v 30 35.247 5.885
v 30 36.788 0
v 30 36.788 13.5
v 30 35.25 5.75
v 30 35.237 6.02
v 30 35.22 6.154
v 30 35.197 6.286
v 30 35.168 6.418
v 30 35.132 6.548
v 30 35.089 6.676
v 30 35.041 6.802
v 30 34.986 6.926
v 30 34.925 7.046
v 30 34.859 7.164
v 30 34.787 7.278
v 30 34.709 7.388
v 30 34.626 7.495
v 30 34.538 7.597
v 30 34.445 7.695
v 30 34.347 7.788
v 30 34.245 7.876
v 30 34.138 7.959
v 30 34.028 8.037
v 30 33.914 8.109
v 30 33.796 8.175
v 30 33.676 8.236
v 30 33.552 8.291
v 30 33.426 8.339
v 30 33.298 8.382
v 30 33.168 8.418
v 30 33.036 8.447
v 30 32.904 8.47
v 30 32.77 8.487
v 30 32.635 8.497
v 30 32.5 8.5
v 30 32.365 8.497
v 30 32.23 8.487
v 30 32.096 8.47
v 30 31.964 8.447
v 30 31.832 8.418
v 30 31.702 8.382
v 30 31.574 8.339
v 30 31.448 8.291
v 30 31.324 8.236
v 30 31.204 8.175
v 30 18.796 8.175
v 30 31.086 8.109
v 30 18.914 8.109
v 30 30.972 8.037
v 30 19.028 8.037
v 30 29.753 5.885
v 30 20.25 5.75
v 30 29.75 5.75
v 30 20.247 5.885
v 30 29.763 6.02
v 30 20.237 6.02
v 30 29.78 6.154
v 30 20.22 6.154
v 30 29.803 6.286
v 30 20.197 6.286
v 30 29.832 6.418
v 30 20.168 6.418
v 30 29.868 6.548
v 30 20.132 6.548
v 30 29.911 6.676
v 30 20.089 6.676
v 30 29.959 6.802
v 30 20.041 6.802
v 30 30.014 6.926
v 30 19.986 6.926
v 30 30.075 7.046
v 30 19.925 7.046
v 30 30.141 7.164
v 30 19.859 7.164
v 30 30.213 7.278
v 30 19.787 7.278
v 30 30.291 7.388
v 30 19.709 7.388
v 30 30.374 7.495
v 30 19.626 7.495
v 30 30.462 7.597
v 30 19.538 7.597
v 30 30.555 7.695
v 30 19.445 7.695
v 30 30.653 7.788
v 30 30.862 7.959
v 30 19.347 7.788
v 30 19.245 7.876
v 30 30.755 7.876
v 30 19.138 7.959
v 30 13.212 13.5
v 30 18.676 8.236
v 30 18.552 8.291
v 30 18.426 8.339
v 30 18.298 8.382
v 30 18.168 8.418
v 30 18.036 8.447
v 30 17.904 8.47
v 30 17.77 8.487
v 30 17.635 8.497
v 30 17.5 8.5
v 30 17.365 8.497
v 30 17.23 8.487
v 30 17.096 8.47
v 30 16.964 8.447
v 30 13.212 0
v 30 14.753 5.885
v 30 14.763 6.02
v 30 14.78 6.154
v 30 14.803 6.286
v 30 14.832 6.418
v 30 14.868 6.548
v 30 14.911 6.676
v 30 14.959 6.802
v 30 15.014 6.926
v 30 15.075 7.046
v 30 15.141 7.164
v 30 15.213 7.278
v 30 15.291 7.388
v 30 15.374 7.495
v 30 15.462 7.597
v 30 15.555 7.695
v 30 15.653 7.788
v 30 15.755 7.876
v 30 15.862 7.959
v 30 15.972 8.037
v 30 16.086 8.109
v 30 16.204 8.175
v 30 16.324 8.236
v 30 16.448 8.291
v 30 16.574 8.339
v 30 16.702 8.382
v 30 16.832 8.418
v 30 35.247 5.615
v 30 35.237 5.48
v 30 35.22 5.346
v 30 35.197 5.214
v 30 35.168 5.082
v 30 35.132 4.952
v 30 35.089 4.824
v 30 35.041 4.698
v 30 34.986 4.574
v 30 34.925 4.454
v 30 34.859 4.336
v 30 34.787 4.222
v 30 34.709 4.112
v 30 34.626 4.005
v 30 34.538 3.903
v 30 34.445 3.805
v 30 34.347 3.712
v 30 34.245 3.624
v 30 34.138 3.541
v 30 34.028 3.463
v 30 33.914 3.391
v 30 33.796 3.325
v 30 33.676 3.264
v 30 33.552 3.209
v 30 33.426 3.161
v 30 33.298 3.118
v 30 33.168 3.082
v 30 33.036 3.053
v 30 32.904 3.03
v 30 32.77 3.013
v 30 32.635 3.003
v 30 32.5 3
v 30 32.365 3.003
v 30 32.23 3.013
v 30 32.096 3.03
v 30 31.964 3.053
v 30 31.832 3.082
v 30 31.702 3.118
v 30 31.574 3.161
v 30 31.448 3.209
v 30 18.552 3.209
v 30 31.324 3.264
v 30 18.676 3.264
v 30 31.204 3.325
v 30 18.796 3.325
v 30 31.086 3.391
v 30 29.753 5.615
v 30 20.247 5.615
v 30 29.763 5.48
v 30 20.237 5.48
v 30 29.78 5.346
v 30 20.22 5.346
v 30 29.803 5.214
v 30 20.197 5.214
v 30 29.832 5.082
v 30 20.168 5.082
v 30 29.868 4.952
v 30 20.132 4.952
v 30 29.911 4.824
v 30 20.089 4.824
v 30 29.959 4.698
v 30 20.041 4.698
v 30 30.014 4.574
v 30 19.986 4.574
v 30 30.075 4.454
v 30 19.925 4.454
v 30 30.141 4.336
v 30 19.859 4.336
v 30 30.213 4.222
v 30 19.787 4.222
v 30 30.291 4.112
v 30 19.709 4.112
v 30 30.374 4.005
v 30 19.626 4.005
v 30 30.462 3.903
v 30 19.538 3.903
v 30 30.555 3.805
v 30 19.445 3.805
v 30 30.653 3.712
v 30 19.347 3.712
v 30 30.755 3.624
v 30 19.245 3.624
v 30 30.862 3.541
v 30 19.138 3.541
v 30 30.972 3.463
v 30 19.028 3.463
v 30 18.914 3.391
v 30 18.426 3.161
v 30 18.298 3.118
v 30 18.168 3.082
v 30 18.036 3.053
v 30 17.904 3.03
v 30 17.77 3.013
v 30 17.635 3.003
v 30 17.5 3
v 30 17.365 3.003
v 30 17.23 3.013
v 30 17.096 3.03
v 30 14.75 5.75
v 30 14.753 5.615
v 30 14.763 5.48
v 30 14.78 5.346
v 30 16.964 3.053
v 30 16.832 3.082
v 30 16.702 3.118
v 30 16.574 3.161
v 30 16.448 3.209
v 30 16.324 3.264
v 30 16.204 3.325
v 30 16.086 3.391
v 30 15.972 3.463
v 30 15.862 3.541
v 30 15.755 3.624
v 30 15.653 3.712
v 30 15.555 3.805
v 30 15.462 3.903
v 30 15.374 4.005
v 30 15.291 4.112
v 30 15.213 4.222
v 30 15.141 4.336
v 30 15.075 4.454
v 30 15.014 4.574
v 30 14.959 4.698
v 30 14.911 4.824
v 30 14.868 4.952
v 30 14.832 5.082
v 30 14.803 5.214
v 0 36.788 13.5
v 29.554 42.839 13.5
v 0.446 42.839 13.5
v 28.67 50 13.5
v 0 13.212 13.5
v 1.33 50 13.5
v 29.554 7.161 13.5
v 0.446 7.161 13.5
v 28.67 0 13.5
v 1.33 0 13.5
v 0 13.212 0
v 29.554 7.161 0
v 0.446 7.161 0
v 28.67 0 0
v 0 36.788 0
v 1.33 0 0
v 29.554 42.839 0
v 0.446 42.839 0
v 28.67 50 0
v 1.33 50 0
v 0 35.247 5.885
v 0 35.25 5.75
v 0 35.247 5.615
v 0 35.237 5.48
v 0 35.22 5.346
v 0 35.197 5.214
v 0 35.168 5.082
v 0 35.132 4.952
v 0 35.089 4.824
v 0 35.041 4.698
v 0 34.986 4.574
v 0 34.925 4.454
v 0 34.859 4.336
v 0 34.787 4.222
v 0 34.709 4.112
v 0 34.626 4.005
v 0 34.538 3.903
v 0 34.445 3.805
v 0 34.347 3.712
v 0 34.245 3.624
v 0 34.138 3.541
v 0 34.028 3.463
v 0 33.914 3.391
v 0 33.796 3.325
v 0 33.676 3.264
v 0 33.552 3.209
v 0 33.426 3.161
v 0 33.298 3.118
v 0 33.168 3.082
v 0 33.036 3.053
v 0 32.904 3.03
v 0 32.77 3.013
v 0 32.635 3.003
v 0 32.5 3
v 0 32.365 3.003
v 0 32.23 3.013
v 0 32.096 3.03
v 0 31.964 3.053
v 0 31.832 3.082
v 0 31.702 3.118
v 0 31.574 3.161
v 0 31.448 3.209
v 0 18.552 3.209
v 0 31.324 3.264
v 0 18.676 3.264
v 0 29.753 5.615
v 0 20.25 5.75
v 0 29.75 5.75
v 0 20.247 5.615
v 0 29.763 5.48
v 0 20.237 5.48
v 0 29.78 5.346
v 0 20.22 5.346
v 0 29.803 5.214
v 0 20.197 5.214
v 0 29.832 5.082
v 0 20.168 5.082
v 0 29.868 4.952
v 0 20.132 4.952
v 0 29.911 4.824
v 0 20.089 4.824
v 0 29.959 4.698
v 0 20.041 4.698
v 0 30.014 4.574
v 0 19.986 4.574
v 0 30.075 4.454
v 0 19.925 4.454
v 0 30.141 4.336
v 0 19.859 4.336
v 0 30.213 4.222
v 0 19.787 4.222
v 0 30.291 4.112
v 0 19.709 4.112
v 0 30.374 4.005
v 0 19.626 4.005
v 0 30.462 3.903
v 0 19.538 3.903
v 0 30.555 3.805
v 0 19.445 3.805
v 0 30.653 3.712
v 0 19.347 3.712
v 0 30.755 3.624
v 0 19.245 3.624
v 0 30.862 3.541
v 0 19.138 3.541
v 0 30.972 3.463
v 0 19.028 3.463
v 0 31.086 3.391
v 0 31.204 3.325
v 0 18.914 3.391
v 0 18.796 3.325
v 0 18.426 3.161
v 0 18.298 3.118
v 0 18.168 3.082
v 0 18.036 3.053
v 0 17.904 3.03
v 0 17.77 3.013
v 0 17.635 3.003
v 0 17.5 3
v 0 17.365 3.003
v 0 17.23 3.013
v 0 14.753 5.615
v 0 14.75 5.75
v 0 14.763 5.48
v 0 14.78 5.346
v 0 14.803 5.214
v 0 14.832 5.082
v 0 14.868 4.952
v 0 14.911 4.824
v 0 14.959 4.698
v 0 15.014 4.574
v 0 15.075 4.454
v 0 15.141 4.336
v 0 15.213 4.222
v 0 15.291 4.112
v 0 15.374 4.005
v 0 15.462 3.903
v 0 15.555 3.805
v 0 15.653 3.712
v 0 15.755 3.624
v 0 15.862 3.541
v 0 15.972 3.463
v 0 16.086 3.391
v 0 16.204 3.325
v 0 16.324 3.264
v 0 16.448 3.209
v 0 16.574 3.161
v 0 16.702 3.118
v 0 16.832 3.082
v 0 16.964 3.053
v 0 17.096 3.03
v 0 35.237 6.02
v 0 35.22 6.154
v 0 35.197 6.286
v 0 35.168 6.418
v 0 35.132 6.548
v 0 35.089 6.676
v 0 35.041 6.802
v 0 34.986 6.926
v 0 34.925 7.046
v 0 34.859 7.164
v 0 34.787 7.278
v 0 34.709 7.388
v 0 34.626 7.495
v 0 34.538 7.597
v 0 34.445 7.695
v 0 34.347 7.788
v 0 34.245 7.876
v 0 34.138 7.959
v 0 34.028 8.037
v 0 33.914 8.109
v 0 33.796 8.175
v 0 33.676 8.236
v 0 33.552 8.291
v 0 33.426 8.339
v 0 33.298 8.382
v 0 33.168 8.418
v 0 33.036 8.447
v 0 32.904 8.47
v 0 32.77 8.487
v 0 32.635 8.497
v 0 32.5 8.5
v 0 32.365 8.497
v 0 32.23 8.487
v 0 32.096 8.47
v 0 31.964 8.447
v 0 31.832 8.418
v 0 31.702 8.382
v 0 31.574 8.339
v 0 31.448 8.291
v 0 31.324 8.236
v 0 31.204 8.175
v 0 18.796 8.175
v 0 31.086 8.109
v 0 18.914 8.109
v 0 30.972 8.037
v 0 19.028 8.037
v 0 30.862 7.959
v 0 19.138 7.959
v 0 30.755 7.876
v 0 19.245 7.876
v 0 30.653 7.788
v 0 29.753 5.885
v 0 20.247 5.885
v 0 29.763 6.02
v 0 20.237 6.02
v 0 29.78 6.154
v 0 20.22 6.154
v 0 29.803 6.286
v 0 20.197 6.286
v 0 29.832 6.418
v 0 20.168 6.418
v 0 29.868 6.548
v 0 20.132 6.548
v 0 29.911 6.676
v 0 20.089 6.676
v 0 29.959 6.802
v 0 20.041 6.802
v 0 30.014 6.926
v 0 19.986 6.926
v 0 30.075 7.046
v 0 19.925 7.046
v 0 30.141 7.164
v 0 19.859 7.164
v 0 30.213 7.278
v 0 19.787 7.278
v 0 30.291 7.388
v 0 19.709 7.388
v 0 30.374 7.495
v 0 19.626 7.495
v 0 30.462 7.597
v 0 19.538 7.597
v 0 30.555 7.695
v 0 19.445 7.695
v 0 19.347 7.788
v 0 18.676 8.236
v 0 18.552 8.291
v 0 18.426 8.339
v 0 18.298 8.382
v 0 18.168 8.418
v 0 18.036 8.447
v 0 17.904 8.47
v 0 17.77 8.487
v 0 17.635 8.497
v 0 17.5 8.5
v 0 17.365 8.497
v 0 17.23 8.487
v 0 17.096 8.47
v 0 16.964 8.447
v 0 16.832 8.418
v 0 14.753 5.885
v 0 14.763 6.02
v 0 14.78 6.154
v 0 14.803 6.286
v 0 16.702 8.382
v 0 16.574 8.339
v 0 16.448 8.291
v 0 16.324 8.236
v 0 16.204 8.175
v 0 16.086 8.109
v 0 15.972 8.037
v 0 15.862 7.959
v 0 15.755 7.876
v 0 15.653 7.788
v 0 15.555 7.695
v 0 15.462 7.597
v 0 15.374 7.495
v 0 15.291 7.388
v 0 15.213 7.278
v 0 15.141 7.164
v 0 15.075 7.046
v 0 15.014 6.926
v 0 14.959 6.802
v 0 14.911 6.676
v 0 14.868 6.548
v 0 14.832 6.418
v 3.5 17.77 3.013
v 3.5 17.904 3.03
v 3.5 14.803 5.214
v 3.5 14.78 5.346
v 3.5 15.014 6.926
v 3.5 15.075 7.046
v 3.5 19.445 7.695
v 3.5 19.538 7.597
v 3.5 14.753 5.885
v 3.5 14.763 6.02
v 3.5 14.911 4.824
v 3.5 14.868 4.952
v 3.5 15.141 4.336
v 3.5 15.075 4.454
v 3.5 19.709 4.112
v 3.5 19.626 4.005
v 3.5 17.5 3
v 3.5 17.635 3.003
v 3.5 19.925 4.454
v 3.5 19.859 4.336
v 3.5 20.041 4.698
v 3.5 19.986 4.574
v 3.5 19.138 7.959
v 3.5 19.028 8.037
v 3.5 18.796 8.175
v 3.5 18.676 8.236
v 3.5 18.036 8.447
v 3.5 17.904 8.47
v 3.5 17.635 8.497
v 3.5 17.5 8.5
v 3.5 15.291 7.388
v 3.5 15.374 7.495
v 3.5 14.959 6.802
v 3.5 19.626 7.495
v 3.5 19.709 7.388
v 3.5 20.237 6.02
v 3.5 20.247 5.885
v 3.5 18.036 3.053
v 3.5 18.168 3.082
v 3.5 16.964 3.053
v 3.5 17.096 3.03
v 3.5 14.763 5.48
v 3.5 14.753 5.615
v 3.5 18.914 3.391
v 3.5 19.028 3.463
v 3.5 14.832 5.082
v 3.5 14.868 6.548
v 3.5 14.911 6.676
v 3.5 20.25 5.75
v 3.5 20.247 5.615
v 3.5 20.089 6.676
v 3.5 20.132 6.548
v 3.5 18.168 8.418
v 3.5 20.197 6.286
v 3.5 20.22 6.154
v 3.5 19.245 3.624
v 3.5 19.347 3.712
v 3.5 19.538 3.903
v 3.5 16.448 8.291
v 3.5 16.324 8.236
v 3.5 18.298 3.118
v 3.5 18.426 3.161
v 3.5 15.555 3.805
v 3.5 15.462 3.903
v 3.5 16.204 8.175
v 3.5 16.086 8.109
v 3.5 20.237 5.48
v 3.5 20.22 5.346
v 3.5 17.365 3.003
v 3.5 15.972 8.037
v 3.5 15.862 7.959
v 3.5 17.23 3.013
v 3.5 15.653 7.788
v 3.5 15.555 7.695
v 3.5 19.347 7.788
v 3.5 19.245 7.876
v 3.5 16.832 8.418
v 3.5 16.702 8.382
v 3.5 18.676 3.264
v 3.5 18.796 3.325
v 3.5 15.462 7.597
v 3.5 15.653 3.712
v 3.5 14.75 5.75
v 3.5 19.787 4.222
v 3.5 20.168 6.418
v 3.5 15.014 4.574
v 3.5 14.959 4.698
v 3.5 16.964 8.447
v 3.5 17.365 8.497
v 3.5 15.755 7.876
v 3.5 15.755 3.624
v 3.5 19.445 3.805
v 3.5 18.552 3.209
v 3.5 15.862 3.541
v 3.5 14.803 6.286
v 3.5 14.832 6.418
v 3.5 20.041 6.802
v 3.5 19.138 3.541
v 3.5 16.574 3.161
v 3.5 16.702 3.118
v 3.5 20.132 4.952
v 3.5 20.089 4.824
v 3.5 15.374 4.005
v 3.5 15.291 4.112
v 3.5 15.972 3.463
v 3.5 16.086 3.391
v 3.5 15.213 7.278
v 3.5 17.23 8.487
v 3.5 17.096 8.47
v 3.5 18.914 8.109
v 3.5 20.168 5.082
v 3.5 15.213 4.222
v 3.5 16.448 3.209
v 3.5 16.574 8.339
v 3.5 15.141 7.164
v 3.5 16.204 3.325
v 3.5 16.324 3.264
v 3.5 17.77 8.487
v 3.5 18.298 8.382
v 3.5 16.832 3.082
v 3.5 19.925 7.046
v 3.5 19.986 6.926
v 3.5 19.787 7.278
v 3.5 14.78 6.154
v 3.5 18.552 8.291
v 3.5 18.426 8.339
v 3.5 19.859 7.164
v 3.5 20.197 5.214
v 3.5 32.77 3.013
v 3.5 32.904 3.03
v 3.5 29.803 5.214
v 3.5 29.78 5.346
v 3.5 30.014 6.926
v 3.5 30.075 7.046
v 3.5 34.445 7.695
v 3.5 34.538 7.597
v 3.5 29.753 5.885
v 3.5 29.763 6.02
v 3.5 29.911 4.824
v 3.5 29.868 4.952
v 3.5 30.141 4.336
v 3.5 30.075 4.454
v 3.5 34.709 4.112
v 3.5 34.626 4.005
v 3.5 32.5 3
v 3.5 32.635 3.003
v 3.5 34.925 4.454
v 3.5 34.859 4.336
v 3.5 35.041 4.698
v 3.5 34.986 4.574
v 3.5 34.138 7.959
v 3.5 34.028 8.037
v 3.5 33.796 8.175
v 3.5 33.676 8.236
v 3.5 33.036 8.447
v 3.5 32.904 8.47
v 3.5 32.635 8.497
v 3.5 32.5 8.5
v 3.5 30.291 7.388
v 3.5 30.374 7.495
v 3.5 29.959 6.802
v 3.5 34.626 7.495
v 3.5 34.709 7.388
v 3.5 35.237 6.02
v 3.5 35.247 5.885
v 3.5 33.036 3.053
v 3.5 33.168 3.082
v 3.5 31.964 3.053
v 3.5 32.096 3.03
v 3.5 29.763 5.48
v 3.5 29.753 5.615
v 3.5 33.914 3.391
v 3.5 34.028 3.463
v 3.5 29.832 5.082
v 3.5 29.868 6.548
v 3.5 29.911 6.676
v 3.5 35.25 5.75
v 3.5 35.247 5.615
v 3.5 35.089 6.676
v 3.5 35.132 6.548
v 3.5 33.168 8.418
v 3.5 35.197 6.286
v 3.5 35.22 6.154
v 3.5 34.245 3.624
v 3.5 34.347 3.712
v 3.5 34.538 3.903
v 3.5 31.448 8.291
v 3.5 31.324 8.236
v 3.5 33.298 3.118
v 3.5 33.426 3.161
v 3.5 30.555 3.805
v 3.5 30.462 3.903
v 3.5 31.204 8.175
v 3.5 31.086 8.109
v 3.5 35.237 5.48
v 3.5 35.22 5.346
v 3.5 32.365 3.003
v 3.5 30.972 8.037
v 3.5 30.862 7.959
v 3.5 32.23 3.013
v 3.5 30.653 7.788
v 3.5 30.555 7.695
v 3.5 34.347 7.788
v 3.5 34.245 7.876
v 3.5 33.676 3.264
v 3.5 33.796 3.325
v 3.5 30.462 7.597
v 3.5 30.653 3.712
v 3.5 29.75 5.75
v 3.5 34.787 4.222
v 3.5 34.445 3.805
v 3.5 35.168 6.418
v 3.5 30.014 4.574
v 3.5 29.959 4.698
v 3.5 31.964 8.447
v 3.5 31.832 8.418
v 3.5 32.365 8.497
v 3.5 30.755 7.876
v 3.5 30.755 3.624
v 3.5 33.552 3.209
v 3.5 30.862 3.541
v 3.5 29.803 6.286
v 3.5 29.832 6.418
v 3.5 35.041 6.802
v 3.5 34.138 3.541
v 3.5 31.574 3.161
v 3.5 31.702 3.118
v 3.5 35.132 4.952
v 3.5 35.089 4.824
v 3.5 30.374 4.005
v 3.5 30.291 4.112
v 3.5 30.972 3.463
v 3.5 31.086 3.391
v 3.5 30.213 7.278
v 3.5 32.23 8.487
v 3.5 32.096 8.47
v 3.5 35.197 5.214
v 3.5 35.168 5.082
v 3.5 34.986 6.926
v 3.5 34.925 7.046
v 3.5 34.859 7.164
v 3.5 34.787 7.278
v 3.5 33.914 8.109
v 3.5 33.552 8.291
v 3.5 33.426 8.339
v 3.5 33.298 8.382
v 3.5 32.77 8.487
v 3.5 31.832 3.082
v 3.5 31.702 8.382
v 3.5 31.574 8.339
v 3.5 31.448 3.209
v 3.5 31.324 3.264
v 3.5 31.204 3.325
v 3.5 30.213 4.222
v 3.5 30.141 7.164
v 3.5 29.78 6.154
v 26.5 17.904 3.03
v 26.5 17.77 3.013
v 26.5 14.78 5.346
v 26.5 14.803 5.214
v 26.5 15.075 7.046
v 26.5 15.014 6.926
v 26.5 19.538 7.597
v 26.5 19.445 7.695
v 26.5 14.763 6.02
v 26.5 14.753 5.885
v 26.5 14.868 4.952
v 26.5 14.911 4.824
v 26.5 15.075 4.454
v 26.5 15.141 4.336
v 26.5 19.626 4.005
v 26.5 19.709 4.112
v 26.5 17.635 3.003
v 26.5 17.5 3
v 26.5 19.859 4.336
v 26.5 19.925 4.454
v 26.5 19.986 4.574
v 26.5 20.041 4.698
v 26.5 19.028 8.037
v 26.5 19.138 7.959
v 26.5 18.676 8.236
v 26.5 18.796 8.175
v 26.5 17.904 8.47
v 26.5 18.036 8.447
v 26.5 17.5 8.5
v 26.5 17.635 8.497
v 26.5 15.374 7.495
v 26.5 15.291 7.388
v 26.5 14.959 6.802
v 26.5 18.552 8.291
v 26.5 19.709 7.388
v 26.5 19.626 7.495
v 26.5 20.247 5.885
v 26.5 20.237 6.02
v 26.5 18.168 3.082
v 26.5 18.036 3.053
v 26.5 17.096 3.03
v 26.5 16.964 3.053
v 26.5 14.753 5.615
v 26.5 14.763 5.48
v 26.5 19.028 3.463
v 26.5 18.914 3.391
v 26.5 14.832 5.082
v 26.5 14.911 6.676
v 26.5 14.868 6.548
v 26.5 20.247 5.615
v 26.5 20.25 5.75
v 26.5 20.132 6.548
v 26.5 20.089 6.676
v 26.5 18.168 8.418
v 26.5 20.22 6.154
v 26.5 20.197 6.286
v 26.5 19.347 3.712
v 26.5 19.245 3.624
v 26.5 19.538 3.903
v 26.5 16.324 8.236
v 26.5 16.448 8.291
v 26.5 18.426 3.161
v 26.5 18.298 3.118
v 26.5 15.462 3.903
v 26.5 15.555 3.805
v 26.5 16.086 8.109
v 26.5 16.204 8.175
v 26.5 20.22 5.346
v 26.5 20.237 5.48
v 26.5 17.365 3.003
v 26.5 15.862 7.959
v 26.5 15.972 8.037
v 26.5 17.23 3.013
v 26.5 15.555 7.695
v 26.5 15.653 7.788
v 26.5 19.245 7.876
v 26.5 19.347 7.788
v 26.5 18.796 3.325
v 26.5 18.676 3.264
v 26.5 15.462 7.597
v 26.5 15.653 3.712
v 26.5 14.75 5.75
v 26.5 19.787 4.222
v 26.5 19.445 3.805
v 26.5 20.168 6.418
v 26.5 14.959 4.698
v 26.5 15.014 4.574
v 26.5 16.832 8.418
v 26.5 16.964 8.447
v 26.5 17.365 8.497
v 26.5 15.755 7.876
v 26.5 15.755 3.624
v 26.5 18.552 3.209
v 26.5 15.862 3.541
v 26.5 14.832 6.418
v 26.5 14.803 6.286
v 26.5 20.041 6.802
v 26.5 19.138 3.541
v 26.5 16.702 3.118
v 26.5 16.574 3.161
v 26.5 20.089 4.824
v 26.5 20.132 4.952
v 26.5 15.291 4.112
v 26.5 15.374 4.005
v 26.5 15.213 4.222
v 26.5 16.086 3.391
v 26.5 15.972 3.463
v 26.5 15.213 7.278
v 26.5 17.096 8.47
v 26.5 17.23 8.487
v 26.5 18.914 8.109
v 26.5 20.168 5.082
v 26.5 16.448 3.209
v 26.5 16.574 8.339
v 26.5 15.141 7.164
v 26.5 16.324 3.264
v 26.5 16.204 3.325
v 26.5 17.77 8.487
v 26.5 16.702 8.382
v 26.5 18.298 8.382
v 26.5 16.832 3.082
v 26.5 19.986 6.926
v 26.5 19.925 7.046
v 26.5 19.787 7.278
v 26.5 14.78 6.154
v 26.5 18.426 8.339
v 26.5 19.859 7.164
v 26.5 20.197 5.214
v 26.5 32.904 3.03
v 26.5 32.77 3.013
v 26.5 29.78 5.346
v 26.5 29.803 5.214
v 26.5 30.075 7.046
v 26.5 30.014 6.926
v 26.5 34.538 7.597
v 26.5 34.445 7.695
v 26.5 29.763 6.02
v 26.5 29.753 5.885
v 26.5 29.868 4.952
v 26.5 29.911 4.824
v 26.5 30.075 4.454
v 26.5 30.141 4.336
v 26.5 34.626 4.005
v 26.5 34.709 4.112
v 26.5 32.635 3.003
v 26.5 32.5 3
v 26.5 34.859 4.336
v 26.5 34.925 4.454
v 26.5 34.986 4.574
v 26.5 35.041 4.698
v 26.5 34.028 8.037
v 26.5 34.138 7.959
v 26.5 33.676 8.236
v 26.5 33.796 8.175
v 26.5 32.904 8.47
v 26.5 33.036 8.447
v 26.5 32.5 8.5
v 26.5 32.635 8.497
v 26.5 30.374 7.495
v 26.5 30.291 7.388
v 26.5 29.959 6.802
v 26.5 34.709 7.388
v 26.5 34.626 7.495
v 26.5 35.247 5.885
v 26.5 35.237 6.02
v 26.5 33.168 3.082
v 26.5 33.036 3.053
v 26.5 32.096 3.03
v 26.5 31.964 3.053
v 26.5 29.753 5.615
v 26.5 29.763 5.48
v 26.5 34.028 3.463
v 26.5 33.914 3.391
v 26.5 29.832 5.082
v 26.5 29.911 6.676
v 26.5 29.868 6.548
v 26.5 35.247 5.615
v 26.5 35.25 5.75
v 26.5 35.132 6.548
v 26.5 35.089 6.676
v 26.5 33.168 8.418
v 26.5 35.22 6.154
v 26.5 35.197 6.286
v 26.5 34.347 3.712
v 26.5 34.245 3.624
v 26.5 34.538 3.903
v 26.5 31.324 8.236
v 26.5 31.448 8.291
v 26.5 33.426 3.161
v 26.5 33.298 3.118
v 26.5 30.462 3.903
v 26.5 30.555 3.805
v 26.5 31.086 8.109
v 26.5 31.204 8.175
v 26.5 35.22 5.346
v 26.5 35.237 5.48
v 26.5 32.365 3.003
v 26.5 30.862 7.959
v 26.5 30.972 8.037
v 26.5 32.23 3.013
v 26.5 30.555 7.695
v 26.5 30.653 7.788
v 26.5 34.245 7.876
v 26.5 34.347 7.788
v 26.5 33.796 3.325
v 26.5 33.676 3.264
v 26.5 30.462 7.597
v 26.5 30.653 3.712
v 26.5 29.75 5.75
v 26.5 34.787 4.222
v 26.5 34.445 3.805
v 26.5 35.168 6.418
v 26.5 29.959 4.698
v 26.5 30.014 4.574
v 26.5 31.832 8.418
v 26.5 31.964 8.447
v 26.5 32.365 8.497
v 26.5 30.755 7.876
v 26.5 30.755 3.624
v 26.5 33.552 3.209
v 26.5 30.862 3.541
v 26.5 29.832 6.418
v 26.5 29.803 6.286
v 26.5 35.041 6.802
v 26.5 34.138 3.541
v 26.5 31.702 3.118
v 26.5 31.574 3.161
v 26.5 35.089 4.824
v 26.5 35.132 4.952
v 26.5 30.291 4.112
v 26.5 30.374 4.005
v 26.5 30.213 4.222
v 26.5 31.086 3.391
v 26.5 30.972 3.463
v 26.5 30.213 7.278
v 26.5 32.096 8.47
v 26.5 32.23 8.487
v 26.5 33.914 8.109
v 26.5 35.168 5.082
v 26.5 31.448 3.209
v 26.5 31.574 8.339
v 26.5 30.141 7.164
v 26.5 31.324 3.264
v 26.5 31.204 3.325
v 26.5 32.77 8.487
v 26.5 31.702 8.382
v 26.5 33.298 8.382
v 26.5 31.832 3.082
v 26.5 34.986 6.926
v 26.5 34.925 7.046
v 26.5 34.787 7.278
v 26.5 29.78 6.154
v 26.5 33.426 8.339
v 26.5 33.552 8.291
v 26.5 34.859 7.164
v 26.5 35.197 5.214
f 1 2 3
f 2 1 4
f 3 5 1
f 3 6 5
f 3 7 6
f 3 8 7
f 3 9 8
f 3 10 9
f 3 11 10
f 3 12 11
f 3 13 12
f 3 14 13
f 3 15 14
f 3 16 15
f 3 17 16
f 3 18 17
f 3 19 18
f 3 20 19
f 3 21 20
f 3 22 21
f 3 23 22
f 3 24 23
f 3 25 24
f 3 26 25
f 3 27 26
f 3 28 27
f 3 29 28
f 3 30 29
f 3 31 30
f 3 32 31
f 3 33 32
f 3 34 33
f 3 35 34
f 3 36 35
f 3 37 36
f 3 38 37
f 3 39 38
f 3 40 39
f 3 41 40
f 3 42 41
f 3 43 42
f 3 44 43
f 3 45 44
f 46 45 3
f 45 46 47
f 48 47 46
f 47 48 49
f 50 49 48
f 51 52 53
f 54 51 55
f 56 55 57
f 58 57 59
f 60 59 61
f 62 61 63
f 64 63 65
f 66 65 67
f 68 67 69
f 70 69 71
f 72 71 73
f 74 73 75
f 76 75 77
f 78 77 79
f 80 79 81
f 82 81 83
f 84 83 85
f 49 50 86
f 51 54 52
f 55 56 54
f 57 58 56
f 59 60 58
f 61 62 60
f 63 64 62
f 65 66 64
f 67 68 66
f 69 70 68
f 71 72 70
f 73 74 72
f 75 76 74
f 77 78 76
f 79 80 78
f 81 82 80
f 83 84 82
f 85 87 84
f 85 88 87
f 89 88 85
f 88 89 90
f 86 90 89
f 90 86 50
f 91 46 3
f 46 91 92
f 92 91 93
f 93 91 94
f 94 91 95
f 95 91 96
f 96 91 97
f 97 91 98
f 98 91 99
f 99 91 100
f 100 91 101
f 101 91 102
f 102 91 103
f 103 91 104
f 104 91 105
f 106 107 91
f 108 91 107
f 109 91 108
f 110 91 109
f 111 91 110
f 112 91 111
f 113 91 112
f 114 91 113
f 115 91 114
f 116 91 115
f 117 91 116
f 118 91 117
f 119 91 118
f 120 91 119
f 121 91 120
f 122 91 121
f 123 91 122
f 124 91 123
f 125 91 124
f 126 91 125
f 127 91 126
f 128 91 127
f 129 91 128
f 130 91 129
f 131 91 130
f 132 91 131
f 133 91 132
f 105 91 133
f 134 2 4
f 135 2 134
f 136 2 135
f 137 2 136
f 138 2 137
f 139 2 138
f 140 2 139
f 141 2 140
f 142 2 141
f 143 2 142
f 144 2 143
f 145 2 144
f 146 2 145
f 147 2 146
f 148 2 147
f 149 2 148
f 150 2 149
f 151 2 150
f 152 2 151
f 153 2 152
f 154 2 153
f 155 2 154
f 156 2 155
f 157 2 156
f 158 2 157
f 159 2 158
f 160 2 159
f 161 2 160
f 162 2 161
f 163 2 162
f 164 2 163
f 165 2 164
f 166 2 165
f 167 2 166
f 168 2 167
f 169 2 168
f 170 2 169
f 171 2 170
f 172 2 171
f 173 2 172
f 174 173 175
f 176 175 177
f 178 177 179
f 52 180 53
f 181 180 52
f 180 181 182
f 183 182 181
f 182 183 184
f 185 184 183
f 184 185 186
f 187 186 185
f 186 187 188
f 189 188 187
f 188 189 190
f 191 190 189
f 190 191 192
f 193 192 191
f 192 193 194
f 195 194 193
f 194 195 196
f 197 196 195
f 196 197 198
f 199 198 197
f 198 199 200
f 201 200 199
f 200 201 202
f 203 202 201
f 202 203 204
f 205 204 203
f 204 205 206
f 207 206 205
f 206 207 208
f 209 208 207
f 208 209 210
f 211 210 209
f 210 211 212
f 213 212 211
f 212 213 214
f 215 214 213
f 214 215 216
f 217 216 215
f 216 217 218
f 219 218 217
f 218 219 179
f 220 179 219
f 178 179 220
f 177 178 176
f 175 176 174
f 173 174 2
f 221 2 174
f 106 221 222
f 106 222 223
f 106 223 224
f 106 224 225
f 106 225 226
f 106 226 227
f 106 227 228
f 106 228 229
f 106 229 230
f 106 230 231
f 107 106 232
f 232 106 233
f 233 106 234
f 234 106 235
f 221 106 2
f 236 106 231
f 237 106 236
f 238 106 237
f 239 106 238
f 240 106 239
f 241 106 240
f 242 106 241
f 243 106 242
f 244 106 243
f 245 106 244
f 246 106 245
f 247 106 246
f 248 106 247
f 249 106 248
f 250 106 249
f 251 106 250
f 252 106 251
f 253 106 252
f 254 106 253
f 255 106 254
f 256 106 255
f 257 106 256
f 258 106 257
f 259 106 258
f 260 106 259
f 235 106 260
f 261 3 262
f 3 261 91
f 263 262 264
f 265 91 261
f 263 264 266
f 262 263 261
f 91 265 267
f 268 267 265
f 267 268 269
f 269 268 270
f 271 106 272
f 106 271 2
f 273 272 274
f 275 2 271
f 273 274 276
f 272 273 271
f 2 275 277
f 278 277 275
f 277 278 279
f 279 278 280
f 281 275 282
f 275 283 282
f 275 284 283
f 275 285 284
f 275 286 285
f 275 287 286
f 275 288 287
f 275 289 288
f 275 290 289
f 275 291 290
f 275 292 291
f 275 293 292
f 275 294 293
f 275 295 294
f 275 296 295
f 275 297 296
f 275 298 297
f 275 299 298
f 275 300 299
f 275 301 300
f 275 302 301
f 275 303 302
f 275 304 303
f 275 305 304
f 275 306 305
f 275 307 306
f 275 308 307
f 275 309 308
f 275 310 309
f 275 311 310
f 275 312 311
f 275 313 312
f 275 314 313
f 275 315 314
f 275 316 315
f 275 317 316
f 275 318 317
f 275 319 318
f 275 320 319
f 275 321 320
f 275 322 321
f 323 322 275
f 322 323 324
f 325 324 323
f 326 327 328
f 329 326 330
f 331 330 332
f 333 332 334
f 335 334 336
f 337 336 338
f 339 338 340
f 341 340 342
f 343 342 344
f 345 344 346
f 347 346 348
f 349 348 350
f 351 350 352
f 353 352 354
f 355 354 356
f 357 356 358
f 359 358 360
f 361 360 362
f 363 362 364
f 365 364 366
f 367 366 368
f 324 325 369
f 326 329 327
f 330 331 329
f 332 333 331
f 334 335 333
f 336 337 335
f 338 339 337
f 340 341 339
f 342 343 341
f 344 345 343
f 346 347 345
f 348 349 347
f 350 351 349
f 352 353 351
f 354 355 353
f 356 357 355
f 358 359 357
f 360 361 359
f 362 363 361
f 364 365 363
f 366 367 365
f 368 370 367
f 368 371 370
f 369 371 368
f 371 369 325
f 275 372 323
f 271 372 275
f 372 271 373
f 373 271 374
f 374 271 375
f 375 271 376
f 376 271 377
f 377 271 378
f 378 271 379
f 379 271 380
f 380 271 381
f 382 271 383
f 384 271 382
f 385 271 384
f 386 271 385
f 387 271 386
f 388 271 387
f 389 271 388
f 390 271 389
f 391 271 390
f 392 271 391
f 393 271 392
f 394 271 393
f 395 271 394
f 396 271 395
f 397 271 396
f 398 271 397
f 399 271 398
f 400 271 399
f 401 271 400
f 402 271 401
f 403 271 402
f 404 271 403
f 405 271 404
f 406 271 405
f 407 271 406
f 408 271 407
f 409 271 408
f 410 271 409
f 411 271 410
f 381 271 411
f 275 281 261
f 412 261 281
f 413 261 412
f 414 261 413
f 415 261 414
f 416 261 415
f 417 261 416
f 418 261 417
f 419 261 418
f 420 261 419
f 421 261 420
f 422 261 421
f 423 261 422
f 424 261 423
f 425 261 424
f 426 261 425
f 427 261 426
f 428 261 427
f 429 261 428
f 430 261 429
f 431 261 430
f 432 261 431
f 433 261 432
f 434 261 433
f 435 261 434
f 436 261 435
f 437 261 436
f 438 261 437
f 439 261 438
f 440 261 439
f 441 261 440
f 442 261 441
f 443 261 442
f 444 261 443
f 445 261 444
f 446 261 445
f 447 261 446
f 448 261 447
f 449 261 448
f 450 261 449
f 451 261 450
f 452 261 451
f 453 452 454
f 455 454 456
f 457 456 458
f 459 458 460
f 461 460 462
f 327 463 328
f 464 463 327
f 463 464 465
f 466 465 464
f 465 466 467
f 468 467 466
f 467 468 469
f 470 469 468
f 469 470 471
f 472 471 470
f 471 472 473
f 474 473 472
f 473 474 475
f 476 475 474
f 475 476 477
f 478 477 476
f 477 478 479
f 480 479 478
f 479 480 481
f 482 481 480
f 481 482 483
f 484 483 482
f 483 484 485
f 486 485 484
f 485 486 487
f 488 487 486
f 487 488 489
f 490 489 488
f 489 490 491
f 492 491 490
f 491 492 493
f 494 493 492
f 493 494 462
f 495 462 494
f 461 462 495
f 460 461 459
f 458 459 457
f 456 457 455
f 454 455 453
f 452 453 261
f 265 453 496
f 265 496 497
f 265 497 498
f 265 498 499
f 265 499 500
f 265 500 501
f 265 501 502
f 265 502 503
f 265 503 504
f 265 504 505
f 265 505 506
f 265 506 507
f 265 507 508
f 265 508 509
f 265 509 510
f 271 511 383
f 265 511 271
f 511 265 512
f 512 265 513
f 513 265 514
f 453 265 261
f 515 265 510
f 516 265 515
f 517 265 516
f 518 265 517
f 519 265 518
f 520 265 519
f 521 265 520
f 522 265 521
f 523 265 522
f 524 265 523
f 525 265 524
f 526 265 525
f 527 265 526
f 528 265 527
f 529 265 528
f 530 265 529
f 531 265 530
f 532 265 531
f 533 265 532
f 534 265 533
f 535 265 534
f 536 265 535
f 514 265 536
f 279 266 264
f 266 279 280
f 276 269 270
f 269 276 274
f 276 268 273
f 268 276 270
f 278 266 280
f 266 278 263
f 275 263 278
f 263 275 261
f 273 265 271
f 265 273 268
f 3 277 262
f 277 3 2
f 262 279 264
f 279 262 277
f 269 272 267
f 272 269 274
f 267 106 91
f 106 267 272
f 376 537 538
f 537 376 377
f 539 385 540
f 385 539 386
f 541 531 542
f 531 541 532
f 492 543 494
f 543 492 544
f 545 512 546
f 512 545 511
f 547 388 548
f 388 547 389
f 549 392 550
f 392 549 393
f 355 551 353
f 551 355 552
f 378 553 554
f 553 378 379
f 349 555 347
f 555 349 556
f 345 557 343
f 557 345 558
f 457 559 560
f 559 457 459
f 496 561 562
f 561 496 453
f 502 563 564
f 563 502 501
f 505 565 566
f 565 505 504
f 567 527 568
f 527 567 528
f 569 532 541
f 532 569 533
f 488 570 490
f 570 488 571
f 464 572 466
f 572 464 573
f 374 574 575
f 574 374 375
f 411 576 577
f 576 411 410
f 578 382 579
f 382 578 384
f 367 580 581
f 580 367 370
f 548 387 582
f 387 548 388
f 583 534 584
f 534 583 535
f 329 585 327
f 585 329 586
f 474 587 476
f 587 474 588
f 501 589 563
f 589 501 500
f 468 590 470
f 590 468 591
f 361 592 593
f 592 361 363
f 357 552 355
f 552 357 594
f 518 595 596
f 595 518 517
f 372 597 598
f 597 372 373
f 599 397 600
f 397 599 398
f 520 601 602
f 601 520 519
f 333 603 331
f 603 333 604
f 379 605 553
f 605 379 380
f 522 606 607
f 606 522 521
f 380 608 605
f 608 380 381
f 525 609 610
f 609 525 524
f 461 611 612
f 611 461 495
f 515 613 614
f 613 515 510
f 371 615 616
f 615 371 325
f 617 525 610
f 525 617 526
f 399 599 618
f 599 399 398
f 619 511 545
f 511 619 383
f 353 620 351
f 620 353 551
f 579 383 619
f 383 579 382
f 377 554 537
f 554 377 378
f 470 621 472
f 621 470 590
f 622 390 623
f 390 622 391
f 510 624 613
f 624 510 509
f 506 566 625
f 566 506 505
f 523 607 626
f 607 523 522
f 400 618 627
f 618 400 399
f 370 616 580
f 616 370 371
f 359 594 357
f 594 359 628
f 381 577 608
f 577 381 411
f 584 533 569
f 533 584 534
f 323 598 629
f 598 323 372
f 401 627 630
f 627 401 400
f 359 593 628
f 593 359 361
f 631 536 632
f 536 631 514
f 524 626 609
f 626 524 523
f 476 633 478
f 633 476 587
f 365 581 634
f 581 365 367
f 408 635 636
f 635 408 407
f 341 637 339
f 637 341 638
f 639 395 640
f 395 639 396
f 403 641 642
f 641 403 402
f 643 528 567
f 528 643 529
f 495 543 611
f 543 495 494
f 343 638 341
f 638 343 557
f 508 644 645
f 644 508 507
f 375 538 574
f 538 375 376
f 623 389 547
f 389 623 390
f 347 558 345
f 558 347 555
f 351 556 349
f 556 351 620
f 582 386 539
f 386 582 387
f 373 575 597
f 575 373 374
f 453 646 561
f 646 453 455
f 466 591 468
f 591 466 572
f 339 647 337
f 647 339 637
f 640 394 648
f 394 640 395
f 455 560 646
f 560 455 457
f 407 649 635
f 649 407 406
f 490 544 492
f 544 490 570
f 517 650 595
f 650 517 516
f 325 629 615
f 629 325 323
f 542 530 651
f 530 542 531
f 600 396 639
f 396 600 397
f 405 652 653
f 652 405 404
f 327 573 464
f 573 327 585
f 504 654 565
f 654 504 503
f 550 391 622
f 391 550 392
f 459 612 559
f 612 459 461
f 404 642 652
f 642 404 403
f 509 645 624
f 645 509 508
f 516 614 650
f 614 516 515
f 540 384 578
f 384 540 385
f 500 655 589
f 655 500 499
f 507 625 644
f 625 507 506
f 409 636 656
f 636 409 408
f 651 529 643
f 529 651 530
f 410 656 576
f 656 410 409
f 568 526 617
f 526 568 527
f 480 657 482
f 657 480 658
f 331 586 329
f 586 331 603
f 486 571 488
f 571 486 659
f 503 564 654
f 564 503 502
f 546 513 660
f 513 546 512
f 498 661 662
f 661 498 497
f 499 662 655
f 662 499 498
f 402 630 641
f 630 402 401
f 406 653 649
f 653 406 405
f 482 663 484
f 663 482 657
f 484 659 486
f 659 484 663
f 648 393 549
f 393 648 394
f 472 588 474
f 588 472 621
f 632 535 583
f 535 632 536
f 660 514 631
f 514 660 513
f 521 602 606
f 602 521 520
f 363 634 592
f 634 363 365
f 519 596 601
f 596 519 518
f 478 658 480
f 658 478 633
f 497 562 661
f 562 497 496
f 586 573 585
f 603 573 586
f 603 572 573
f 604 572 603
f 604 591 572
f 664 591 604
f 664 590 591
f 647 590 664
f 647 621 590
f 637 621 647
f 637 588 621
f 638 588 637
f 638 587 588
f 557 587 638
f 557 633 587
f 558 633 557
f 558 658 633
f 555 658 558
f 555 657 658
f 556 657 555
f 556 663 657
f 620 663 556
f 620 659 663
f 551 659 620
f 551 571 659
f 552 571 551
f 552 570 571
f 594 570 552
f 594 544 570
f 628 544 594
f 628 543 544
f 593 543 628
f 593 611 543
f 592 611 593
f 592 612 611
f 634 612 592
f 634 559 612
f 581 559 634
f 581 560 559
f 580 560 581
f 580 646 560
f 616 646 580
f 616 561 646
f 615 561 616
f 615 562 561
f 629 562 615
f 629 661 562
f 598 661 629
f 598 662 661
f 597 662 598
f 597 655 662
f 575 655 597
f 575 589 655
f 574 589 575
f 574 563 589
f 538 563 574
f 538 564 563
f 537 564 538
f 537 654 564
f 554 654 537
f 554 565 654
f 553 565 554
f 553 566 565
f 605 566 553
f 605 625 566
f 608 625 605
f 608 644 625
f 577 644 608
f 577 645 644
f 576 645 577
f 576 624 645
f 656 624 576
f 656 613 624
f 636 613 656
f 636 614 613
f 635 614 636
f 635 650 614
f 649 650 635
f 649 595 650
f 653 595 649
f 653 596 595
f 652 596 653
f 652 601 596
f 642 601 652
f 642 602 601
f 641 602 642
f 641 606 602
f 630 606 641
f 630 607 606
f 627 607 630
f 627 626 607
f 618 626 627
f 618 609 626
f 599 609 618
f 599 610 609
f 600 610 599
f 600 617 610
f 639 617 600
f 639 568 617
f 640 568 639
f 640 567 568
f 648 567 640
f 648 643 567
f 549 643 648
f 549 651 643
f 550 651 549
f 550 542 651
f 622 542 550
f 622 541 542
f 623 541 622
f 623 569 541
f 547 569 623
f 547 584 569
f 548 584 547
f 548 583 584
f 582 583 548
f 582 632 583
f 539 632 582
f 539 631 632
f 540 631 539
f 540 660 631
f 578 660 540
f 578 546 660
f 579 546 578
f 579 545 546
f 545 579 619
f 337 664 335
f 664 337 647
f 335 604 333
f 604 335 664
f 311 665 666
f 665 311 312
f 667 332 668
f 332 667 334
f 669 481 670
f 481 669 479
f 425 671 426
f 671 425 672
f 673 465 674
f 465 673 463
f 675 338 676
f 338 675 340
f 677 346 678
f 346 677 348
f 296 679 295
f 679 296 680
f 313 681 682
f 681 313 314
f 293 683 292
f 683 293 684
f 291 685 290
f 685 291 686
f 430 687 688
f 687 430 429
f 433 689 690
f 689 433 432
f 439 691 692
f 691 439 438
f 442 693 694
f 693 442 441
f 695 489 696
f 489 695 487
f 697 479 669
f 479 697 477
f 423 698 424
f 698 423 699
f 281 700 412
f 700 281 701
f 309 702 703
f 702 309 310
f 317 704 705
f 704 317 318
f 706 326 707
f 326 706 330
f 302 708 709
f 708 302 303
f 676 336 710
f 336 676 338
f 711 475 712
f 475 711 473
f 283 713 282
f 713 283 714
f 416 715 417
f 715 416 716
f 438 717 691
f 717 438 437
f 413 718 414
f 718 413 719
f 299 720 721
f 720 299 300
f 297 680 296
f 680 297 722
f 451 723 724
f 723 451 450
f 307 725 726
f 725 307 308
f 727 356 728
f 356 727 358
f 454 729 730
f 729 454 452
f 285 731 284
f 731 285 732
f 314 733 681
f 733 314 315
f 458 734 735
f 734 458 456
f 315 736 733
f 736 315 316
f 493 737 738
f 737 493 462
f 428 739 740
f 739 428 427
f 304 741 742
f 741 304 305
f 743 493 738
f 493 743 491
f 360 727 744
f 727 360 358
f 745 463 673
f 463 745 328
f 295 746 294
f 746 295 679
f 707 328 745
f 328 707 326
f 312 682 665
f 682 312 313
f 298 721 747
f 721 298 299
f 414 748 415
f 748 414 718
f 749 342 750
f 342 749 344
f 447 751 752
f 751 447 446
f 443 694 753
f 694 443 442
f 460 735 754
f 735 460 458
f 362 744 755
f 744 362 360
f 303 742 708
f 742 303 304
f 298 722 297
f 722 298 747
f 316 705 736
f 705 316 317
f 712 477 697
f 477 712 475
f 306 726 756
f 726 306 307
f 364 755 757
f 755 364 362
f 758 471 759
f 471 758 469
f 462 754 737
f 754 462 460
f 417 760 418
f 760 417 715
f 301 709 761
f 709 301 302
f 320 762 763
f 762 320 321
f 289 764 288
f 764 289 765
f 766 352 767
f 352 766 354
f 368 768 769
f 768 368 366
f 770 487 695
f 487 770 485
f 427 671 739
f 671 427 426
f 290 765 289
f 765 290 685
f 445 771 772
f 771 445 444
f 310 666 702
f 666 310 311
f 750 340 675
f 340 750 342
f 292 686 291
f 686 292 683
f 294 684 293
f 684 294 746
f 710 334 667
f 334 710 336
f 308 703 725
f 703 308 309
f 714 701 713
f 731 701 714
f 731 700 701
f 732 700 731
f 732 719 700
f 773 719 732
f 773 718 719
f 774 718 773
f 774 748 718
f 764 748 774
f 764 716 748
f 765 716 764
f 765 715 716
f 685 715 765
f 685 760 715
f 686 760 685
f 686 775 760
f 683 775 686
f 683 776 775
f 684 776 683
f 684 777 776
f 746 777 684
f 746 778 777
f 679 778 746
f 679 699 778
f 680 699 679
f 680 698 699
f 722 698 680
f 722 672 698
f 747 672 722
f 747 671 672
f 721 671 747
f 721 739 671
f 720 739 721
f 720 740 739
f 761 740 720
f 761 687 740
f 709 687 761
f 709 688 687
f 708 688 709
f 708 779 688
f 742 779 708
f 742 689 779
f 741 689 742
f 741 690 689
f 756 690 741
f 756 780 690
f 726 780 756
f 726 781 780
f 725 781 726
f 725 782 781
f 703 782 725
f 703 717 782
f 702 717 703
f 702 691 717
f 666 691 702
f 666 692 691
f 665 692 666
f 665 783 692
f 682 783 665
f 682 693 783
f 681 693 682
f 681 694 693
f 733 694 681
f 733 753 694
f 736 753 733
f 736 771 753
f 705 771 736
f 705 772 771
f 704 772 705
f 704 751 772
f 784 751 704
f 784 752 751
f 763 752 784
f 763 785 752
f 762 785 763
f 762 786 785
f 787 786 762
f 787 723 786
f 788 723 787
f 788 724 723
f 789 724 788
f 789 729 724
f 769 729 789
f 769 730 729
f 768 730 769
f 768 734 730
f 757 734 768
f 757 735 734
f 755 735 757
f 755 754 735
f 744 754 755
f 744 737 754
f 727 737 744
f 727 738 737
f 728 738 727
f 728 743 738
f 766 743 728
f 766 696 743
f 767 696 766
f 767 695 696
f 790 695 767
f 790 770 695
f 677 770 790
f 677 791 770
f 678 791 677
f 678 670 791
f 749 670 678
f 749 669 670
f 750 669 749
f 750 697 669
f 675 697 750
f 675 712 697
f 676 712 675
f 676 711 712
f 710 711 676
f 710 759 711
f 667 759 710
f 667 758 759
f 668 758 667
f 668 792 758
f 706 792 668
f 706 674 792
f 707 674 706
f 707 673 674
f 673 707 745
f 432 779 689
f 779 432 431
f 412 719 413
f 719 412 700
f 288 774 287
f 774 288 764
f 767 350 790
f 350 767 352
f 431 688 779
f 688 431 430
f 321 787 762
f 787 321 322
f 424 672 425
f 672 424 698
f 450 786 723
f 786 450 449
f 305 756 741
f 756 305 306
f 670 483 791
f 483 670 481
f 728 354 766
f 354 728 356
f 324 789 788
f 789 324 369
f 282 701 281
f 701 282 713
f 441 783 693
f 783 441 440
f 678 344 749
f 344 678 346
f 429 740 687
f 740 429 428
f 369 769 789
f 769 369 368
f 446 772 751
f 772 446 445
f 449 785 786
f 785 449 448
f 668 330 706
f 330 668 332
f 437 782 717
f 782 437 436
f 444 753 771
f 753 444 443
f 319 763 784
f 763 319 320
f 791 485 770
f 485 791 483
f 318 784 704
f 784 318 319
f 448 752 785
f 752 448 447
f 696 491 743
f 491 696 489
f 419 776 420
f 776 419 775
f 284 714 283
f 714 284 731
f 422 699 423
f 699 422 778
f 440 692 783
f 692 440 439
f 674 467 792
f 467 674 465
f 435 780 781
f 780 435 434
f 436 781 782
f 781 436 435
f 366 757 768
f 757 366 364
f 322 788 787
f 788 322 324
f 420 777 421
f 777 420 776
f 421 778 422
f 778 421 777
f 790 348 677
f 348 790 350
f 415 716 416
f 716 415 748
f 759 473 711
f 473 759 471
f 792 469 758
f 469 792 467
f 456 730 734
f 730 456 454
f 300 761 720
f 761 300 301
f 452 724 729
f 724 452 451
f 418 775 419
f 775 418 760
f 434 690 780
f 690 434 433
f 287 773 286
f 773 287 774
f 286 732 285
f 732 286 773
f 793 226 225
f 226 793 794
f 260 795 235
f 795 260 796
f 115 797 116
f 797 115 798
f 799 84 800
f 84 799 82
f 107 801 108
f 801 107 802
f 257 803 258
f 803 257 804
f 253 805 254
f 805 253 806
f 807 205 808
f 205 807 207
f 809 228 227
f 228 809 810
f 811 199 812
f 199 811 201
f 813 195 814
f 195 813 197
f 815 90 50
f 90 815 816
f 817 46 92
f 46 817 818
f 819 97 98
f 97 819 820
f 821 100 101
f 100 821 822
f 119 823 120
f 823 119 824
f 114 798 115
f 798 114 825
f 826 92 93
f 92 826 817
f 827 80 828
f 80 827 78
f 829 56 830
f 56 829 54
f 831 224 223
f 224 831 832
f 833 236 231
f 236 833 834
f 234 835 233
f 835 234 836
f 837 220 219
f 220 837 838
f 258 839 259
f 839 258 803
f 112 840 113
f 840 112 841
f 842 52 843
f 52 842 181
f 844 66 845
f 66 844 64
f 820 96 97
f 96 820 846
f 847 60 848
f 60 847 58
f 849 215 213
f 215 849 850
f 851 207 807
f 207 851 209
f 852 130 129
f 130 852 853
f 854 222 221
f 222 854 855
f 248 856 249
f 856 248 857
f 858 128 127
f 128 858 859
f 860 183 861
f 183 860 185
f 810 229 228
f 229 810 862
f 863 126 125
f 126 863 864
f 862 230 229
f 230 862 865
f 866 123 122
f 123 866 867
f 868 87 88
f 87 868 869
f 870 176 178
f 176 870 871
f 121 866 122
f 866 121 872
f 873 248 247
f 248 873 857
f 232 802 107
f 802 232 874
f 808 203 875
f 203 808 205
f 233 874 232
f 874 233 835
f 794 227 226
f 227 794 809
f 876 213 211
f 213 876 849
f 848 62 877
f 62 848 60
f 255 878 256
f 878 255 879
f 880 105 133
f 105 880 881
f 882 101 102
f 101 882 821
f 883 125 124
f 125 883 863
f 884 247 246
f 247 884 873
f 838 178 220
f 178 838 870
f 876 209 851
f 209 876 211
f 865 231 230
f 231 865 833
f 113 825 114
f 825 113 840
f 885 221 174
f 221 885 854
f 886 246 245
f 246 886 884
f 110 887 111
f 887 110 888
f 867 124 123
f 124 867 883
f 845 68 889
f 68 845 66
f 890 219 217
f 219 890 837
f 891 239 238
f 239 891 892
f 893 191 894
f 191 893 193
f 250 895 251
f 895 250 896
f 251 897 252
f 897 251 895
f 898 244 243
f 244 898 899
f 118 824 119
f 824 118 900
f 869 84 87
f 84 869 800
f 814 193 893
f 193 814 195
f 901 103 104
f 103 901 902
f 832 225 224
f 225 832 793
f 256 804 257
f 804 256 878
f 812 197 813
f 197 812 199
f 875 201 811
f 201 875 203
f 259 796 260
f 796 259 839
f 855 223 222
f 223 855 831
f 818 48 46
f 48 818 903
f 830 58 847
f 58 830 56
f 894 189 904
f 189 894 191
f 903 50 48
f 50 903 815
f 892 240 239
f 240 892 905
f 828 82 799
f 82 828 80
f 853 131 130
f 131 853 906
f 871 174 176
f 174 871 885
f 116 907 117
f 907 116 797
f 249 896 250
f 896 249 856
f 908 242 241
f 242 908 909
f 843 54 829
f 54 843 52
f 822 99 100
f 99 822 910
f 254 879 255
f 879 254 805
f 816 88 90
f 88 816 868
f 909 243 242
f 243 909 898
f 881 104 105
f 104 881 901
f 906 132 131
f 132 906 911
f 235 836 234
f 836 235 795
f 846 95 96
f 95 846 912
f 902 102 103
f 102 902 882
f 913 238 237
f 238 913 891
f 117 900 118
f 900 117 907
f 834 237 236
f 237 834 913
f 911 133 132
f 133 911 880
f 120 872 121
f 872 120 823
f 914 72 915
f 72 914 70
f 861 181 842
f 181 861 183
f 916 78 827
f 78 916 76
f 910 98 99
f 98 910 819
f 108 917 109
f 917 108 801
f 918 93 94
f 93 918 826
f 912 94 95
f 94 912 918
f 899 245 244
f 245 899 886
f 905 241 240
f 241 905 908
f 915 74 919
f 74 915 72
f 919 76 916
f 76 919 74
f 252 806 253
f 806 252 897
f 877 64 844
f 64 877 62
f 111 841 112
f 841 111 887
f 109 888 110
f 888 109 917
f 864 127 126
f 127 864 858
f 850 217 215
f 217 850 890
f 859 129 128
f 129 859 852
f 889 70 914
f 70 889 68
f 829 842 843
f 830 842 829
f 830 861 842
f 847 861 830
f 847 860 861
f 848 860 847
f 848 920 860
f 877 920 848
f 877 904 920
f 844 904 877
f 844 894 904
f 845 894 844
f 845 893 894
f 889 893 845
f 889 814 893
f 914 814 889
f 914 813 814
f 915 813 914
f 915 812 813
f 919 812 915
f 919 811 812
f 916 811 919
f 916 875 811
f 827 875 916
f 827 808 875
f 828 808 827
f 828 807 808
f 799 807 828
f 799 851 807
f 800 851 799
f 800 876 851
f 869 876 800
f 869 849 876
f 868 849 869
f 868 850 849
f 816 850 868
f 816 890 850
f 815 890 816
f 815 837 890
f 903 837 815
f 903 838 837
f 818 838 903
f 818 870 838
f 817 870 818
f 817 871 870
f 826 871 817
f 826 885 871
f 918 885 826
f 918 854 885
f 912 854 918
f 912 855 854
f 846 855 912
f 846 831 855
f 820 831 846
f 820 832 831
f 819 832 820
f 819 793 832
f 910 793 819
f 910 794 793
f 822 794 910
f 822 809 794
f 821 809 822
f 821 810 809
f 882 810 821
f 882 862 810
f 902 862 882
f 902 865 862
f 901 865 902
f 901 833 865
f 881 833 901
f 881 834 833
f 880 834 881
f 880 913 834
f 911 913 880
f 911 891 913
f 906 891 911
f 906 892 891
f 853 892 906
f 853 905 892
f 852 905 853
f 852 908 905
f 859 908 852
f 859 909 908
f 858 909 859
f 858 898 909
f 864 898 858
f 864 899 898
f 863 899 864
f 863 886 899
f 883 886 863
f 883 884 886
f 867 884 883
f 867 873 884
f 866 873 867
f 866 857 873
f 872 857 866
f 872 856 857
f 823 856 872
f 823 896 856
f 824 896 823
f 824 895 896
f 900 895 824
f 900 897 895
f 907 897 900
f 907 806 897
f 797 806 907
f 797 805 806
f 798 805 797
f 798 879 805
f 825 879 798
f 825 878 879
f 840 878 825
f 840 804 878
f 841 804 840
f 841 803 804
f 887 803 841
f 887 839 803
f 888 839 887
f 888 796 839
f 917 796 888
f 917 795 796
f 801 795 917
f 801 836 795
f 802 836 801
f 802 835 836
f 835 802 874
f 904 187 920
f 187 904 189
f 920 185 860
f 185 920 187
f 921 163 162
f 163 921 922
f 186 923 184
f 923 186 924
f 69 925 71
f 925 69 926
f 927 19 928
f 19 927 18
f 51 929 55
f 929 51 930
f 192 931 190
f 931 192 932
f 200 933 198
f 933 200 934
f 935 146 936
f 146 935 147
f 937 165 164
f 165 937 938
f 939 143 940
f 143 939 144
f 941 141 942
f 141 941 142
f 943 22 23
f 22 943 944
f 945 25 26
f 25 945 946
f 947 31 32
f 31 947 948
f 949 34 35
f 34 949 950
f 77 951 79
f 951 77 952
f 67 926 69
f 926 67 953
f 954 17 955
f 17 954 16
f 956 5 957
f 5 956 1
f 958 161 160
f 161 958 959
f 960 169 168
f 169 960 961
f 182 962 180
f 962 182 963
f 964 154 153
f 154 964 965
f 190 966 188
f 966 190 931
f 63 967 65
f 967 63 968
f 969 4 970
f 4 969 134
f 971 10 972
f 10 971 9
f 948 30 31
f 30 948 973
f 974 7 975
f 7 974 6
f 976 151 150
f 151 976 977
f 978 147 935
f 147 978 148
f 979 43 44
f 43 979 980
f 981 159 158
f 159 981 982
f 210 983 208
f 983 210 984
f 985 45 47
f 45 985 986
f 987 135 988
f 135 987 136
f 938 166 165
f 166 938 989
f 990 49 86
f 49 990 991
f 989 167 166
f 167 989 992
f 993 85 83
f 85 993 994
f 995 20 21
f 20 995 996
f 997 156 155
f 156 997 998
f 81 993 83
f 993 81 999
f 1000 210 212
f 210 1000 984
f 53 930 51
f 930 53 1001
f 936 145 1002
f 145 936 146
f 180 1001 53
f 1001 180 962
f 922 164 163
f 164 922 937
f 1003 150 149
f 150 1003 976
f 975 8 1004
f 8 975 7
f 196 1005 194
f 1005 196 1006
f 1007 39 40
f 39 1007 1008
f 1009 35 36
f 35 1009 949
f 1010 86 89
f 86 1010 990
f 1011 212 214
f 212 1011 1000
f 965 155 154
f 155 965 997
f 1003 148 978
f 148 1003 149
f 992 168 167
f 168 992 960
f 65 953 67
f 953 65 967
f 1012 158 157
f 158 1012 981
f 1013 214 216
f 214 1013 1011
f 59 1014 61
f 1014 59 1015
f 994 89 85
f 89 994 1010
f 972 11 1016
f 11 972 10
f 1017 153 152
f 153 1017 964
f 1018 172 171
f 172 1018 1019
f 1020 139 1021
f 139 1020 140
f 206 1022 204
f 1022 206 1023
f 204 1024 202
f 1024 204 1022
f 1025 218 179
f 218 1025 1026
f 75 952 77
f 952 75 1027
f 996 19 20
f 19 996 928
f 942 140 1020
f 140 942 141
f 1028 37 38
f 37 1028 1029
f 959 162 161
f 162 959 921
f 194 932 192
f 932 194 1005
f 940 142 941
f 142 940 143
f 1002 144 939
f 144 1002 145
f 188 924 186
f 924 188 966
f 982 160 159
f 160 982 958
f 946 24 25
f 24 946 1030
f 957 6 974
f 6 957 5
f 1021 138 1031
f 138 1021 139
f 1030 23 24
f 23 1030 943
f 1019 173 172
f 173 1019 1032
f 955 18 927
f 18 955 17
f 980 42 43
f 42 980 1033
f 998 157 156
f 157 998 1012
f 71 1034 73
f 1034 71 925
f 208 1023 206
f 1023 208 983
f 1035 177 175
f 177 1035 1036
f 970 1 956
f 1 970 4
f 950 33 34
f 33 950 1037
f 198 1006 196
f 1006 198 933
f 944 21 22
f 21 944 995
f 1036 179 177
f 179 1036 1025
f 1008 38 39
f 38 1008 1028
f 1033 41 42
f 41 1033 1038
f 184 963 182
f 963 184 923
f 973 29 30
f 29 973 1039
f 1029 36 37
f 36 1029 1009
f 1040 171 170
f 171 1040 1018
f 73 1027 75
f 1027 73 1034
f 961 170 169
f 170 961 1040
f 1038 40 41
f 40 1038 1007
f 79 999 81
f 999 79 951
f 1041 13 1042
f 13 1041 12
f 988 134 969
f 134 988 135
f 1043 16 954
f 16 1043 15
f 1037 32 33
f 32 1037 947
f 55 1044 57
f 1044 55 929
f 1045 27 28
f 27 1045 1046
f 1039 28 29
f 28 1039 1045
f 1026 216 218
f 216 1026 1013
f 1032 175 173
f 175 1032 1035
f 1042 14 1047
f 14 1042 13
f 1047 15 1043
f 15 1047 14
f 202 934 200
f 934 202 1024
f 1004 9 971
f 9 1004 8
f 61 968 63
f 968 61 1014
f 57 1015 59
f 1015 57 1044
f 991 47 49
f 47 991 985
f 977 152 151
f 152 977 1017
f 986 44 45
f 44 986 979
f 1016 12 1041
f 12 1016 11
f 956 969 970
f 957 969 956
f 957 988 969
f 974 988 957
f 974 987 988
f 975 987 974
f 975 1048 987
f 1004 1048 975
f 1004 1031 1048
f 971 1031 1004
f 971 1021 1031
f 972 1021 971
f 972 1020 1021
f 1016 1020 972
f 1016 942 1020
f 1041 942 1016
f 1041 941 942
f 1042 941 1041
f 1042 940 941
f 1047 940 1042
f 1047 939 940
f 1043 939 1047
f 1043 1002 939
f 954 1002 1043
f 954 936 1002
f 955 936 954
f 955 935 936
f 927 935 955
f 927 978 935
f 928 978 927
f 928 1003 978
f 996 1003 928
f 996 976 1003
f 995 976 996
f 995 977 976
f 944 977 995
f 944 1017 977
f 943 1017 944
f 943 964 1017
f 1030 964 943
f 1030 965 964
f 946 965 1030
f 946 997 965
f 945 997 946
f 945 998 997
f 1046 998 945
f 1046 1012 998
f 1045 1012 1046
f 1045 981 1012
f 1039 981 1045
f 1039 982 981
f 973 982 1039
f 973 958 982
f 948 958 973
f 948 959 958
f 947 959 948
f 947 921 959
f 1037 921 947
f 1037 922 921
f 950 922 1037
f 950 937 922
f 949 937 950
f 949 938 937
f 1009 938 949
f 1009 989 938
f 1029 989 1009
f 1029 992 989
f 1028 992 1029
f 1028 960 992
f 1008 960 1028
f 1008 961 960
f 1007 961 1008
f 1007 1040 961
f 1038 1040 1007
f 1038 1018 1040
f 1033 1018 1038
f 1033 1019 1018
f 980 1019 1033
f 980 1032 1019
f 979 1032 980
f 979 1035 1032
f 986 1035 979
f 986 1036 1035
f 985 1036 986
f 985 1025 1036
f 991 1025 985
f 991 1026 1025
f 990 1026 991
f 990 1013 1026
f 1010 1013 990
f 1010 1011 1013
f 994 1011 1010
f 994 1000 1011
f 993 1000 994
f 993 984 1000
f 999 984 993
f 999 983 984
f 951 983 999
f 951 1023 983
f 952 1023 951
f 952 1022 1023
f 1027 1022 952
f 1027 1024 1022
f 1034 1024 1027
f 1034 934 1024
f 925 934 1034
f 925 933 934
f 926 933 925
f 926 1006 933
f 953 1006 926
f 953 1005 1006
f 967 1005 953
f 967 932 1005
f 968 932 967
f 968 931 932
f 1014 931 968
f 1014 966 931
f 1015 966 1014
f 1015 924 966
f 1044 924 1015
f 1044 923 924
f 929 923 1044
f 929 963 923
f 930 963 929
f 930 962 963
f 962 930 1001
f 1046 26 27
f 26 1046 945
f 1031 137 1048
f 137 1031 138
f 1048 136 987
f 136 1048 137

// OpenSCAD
// Copyright 2024 Martin Scheidt (Attribution 4.0 International, CC-BY 4.0)
//
// You are free to copy and redistribute the material in any medium or format.
// You are free to remix, transform, and build upon the material for any purpose, even commercially.
// You must give appropriate credit, provide a link to the license, and indicate if changes were made.
// You may not apply legal terms or technological measures that legally restrict others from doing anything the license permits.
// No warranties are given.

include<config.scad>

curvedBox();

module magnet_hole(){
    cylinder(h=magnet_thickness+move_tolerance, d=magnet_diameter+move_tolerance);
}

module curvedBox(){
    module box(){
        difference(){
            cube([body_width, body_depth, body_height]);
        }
    }
    module round_edge(){
        cylinder(h=body_height, r=track_arc_inner_radius);
    }
    difference(){
        intersection(){
            intersection(){
                translate([0,0,0])box();
                translate([track_arc_inner_radius-sagitta,body_depth/2,0])round_edge();
            }
            intersection(){
                translate([0,0,0])box();
                translate([body_width-track_arc_inner_radius+sagitta,body_depth/2,0])round_edge();
            }
        }
        //magnet holes
        translate([0,body_depth/2 - magnet_distance_to_middle, magnet_z])rotate([0,90,0])magnet_hole();
        translate([0,body_depth/2 + magnet_distance_to_middle, magnet_z])rotate([0,90,0])magnet_hole();
        translate([body_width-magnet_thickness-0.5,body_depth/2 - magnet_distance_to_middle, magnet_z])rotate([0,90,0])magnet_hole();
        translate([body_width-magnet_thickness-0.5,body_depth/2 + magnet_distance_to_middle, magnet_z])rotate([0,90,0])magnet_hole();
        
    }
}
